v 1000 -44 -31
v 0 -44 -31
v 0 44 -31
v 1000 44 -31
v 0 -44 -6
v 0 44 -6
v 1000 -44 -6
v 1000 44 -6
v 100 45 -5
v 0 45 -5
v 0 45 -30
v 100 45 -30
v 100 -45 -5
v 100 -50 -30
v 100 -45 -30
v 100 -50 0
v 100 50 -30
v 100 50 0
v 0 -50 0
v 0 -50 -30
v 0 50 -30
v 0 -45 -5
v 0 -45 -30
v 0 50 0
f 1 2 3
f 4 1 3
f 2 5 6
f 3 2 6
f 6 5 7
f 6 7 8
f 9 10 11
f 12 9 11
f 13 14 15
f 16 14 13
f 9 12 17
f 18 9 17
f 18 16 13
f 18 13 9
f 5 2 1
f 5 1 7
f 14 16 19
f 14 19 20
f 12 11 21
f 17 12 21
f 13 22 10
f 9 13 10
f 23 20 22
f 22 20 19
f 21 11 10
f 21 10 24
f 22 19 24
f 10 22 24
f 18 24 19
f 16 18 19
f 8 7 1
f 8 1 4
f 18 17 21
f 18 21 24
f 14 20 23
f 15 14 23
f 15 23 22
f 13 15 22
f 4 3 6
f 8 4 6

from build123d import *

# Parameters (mm, degrees)
F1_DEPTH = 100
F2_W     = 88
F2_H     = 25
F3_DEPTH = 1000


with BuildPart() as f1:
    # F0 (on Right) → F1 (new body)
    with BuildSketch(Plane.YZ):
        Polygon((50, -30), (50, 0), (-50, 0), (-50, -30), (-45, -30), (-45, -5), (45, -5), (45, -30), align=None)
    extrude(amount=F1_DEPTH)


with BuildPart() as f3:
    # F2 (on Right) → F3 (new body)
    with BuildSketch(Plane.YZ):
        with Locations((0, -18.5)):
            Rectangle(F2_W, F2_H)
    extrude(amount=F3_DEPTH)


solid = Compound([f1.part, f3.part])
